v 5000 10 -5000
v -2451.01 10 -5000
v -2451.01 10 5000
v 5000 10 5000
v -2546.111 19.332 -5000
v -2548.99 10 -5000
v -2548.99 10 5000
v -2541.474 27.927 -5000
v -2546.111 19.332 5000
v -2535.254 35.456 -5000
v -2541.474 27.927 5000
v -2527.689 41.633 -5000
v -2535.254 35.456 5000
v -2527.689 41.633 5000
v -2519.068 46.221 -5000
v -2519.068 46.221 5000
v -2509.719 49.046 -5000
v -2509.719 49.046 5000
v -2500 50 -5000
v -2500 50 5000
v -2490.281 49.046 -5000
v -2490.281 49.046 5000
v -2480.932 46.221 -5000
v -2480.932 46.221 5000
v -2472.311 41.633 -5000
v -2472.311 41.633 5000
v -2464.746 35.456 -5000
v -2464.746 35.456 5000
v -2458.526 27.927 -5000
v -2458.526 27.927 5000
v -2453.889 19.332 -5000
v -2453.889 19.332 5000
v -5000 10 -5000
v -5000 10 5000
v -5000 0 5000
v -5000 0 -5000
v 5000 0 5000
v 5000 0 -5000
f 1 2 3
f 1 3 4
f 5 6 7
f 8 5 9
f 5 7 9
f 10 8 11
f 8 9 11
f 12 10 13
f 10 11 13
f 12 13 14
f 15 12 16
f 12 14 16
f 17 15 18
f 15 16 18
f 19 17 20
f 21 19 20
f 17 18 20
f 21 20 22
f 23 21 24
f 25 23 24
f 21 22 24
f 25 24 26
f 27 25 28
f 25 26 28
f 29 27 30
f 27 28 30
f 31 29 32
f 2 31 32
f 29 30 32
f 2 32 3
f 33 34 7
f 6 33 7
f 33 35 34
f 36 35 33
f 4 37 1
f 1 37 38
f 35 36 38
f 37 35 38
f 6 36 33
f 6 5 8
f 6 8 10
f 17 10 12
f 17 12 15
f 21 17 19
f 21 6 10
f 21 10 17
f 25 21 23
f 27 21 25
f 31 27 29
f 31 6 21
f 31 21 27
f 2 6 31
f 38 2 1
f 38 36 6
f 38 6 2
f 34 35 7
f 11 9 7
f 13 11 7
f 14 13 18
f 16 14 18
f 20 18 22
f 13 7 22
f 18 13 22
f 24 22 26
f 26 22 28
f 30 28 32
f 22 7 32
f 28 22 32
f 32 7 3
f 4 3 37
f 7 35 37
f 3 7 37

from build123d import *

# Parameters (mm, degrees)
SKETCH1_W           = 10000
SKETCH1_H           = 10000
BOSS_EXTRUDE1_DEPTH = 10
BOSS_EXTRUDE3_DEPTH = 10000


with BuildPart() as part:
    # Sketch1 → Boss-Extrude1 (new body)
    with BuildSketch(Plane(origin=(0, 0, 0), x_dir=(1, 0, 0), z_dir=(0, 1, 0))):
        Rectangle(SKETCH1_W, SKETCH1_H)
    extrude(amount=BOSS_EXTRUDE1_DEPTH)

    # Sketch4 → Boss-Extrude3 (add)
    with BuildSketch(Plane.XY.offset(5000)):
        with BuildLine():
            Line((-2451.010205144, 10), (-2548.989794856, 10))
            ThreePointArc((-2548.989794856, 10), (-2500, 50), (-2451.010205144, 10))
        make_face()
    extrude(amount=-BOSS_EXTRUDE3_DEPTH)


solid = part.part
